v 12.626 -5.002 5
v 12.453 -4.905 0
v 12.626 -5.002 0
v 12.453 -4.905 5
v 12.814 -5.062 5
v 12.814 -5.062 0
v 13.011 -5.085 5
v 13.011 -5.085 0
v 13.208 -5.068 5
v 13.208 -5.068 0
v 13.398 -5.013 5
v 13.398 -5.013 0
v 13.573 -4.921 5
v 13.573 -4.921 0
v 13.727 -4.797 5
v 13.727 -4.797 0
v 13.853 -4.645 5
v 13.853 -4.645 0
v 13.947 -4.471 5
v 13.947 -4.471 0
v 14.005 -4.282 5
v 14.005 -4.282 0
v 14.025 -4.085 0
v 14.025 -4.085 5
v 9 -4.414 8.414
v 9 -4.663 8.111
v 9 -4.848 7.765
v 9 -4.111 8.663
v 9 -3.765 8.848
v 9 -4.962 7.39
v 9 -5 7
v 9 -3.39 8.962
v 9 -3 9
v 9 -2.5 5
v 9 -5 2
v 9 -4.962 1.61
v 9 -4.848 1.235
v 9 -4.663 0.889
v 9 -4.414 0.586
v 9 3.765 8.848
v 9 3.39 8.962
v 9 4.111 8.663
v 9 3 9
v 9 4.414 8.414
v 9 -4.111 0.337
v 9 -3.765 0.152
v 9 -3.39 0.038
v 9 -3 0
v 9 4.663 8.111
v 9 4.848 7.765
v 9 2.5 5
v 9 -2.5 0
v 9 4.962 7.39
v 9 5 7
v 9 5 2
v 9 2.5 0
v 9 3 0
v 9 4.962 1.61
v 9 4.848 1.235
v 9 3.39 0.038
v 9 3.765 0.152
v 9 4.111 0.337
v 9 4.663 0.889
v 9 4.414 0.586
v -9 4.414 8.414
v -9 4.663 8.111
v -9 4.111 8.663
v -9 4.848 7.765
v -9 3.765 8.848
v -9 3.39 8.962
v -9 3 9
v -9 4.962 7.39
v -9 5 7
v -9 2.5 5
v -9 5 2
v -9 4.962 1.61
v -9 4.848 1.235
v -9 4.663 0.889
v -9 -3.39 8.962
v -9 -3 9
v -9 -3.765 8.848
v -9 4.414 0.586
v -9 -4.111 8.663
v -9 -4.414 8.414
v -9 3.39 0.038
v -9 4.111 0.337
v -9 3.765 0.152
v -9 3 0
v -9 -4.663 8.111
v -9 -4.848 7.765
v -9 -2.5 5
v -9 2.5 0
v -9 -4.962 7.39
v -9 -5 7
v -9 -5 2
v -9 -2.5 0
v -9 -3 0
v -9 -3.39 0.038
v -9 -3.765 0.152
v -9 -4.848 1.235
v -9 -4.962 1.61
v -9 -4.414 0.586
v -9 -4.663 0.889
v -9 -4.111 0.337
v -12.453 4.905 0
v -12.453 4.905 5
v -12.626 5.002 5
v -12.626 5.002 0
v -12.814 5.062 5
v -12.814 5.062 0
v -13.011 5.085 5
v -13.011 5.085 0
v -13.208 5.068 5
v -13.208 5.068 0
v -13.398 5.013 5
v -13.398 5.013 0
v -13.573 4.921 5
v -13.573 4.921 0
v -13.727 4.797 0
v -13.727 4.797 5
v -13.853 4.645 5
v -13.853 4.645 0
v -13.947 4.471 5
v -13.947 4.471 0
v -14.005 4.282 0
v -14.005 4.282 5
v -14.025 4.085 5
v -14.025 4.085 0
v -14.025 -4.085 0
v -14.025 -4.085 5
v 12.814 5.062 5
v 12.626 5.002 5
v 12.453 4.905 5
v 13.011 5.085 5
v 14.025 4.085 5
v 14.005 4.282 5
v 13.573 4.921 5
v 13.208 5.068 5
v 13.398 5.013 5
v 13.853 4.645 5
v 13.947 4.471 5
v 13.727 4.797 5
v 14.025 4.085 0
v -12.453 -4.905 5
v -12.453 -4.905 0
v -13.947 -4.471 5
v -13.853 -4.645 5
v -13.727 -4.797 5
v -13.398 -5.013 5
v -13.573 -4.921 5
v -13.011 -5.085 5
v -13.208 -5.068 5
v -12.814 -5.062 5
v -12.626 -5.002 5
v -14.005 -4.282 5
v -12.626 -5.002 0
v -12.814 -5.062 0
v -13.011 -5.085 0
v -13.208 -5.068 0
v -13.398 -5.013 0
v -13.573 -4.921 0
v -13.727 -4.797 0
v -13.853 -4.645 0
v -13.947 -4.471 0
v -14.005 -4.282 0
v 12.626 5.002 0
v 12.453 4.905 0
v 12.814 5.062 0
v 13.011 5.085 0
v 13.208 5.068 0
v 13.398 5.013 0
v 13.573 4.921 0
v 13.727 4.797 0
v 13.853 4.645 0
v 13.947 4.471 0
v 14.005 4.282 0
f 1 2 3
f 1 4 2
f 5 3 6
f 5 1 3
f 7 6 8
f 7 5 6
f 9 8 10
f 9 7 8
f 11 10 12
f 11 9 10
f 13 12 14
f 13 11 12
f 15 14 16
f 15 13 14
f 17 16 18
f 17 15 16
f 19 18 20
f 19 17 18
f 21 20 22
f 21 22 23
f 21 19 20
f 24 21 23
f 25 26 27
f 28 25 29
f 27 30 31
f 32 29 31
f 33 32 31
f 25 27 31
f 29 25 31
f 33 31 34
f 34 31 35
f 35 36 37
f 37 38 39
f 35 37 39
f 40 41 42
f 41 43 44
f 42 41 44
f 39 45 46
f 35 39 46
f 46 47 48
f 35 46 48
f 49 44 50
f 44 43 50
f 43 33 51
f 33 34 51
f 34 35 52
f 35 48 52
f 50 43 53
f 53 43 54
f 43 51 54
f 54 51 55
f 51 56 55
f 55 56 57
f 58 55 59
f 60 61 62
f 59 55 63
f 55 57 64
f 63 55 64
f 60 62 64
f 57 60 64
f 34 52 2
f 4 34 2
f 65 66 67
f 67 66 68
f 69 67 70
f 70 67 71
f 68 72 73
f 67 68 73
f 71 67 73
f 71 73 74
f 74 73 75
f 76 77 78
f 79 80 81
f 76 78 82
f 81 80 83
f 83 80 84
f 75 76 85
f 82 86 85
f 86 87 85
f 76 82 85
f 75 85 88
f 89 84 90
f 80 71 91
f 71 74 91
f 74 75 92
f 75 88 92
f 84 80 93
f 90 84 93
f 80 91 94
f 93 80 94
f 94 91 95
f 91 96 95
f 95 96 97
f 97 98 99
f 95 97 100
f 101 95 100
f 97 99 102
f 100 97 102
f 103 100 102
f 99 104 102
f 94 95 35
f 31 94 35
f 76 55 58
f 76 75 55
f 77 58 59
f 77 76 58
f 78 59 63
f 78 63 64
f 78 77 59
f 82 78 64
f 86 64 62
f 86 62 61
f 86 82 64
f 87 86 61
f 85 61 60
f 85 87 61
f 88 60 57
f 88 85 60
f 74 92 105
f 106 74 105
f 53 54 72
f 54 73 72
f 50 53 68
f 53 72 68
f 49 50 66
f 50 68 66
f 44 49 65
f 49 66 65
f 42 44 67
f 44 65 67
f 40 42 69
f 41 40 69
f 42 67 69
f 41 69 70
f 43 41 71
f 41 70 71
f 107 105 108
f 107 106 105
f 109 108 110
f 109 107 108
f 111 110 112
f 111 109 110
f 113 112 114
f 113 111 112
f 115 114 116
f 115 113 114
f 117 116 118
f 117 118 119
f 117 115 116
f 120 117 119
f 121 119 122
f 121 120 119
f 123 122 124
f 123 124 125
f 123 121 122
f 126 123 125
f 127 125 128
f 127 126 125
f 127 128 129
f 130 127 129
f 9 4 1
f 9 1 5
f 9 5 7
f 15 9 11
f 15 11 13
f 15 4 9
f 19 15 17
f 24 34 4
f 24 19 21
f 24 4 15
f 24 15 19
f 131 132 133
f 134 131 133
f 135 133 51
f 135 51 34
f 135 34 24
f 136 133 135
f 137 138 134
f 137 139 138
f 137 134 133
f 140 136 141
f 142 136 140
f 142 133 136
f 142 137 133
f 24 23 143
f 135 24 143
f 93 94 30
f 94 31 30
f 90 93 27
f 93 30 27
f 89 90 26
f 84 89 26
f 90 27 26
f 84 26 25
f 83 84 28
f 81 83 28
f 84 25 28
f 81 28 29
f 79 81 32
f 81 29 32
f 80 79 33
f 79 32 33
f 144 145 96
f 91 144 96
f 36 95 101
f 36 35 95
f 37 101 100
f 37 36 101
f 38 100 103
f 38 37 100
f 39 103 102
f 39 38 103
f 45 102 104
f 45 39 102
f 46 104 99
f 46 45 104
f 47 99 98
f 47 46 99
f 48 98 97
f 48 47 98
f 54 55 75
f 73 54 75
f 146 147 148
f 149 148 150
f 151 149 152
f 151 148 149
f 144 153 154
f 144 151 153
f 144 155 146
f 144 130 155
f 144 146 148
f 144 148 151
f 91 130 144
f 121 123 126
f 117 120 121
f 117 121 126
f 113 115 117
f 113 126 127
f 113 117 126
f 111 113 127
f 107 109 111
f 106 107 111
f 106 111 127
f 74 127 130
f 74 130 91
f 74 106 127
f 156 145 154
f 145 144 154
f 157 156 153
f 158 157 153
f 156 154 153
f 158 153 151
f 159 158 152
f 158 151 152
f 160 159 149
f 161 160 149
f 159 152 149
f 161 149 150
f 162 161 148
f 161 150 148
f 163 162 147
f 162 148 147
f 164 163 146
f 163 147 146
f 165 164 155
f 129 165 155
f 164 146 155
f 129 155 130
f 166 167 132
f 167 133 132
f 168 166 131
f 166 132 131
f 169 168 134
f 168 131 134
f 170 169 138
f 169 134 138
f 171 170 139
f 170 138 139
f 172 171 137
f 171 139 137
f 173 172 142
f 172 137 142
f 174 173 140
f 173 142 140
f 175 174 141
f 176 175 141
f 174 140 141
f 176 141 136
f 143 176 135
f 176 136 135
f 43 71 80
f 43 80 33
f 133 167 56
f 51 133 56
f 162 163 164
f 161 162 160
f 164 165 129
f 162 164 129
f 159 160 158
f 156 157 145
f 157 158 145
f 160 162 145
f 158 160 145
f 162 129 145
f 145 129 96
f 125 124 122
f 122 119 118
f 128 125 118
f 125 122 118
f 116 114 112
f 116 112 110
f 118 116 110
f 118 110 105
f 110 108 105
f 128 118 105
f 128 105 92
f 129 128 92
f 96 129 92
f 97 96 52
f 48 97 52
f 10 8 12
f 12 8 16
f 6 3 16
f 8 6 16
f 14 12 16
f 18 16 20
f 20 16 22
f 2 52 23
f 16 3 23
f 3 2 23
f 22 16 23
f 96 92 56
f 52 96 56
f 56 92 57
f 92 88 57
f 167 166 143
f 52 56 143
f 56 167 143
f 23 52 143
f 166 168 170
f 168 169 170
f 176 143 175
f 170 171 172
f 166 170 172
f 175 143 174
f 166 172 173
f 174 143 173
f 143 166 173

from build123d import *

# Parameters (mm, degrees)
F1_DEPTH = 9
F2_R     = 2
F3_DEPTH = 5
F4_R     = 1


with BuildPart() as f1:
    # F0 (on Top) → F1 (new body)
    with BuildSketch(Plane.XY):
        Polygon((9, 5), (0, 5), (-9, 5), (-9, 2.5), (-9, -2.5), (-9, -5), (0, -5), (9, -5), (9, -2.5), (9, 0), (9, 2.5), align=None)
    extrude(amount=F1_DEPTH)

    # F2
    f2_edges = [f1.edges().sort_by_distance(p)[0] for p in [
        (0, -5, 9),
        (0, 5, 9),
        (0, 5, 0),
        (0, -5, 0),
    ]]
    fillet(f2_edges, radius=F2_R)

    # F0 (on Top) → F3 (join)
    with BuildSketch(Plane.XY):
        Polygon((14.0249378106, 6), (9, 2.5), (9, 0), (14.0249378106, 0), align=None)
        Polygon((14.0249378106, 0), (9, 0), (9, -2.5), (14.0249378106, -6), align=None)
        Polygon((-9, -2.5), (-9, 2.5), (-14.0249378106, 6), (-14.0249378106, -6), align=None)
    extrude(amount=F3_DEPTH)

    # F4
    f4_edges = [f1.edges().sort_by_distance(p)[0] for p in [
        (-14.024938, 6, 2.5),
        (-14.024938, -6, 2.5),
        (14.024938, -6, 2.5),
        (14.024938, 6, 2.5),
    ]]
    fillet(f4_edges, radius=F4_R)


solid = f1.part
